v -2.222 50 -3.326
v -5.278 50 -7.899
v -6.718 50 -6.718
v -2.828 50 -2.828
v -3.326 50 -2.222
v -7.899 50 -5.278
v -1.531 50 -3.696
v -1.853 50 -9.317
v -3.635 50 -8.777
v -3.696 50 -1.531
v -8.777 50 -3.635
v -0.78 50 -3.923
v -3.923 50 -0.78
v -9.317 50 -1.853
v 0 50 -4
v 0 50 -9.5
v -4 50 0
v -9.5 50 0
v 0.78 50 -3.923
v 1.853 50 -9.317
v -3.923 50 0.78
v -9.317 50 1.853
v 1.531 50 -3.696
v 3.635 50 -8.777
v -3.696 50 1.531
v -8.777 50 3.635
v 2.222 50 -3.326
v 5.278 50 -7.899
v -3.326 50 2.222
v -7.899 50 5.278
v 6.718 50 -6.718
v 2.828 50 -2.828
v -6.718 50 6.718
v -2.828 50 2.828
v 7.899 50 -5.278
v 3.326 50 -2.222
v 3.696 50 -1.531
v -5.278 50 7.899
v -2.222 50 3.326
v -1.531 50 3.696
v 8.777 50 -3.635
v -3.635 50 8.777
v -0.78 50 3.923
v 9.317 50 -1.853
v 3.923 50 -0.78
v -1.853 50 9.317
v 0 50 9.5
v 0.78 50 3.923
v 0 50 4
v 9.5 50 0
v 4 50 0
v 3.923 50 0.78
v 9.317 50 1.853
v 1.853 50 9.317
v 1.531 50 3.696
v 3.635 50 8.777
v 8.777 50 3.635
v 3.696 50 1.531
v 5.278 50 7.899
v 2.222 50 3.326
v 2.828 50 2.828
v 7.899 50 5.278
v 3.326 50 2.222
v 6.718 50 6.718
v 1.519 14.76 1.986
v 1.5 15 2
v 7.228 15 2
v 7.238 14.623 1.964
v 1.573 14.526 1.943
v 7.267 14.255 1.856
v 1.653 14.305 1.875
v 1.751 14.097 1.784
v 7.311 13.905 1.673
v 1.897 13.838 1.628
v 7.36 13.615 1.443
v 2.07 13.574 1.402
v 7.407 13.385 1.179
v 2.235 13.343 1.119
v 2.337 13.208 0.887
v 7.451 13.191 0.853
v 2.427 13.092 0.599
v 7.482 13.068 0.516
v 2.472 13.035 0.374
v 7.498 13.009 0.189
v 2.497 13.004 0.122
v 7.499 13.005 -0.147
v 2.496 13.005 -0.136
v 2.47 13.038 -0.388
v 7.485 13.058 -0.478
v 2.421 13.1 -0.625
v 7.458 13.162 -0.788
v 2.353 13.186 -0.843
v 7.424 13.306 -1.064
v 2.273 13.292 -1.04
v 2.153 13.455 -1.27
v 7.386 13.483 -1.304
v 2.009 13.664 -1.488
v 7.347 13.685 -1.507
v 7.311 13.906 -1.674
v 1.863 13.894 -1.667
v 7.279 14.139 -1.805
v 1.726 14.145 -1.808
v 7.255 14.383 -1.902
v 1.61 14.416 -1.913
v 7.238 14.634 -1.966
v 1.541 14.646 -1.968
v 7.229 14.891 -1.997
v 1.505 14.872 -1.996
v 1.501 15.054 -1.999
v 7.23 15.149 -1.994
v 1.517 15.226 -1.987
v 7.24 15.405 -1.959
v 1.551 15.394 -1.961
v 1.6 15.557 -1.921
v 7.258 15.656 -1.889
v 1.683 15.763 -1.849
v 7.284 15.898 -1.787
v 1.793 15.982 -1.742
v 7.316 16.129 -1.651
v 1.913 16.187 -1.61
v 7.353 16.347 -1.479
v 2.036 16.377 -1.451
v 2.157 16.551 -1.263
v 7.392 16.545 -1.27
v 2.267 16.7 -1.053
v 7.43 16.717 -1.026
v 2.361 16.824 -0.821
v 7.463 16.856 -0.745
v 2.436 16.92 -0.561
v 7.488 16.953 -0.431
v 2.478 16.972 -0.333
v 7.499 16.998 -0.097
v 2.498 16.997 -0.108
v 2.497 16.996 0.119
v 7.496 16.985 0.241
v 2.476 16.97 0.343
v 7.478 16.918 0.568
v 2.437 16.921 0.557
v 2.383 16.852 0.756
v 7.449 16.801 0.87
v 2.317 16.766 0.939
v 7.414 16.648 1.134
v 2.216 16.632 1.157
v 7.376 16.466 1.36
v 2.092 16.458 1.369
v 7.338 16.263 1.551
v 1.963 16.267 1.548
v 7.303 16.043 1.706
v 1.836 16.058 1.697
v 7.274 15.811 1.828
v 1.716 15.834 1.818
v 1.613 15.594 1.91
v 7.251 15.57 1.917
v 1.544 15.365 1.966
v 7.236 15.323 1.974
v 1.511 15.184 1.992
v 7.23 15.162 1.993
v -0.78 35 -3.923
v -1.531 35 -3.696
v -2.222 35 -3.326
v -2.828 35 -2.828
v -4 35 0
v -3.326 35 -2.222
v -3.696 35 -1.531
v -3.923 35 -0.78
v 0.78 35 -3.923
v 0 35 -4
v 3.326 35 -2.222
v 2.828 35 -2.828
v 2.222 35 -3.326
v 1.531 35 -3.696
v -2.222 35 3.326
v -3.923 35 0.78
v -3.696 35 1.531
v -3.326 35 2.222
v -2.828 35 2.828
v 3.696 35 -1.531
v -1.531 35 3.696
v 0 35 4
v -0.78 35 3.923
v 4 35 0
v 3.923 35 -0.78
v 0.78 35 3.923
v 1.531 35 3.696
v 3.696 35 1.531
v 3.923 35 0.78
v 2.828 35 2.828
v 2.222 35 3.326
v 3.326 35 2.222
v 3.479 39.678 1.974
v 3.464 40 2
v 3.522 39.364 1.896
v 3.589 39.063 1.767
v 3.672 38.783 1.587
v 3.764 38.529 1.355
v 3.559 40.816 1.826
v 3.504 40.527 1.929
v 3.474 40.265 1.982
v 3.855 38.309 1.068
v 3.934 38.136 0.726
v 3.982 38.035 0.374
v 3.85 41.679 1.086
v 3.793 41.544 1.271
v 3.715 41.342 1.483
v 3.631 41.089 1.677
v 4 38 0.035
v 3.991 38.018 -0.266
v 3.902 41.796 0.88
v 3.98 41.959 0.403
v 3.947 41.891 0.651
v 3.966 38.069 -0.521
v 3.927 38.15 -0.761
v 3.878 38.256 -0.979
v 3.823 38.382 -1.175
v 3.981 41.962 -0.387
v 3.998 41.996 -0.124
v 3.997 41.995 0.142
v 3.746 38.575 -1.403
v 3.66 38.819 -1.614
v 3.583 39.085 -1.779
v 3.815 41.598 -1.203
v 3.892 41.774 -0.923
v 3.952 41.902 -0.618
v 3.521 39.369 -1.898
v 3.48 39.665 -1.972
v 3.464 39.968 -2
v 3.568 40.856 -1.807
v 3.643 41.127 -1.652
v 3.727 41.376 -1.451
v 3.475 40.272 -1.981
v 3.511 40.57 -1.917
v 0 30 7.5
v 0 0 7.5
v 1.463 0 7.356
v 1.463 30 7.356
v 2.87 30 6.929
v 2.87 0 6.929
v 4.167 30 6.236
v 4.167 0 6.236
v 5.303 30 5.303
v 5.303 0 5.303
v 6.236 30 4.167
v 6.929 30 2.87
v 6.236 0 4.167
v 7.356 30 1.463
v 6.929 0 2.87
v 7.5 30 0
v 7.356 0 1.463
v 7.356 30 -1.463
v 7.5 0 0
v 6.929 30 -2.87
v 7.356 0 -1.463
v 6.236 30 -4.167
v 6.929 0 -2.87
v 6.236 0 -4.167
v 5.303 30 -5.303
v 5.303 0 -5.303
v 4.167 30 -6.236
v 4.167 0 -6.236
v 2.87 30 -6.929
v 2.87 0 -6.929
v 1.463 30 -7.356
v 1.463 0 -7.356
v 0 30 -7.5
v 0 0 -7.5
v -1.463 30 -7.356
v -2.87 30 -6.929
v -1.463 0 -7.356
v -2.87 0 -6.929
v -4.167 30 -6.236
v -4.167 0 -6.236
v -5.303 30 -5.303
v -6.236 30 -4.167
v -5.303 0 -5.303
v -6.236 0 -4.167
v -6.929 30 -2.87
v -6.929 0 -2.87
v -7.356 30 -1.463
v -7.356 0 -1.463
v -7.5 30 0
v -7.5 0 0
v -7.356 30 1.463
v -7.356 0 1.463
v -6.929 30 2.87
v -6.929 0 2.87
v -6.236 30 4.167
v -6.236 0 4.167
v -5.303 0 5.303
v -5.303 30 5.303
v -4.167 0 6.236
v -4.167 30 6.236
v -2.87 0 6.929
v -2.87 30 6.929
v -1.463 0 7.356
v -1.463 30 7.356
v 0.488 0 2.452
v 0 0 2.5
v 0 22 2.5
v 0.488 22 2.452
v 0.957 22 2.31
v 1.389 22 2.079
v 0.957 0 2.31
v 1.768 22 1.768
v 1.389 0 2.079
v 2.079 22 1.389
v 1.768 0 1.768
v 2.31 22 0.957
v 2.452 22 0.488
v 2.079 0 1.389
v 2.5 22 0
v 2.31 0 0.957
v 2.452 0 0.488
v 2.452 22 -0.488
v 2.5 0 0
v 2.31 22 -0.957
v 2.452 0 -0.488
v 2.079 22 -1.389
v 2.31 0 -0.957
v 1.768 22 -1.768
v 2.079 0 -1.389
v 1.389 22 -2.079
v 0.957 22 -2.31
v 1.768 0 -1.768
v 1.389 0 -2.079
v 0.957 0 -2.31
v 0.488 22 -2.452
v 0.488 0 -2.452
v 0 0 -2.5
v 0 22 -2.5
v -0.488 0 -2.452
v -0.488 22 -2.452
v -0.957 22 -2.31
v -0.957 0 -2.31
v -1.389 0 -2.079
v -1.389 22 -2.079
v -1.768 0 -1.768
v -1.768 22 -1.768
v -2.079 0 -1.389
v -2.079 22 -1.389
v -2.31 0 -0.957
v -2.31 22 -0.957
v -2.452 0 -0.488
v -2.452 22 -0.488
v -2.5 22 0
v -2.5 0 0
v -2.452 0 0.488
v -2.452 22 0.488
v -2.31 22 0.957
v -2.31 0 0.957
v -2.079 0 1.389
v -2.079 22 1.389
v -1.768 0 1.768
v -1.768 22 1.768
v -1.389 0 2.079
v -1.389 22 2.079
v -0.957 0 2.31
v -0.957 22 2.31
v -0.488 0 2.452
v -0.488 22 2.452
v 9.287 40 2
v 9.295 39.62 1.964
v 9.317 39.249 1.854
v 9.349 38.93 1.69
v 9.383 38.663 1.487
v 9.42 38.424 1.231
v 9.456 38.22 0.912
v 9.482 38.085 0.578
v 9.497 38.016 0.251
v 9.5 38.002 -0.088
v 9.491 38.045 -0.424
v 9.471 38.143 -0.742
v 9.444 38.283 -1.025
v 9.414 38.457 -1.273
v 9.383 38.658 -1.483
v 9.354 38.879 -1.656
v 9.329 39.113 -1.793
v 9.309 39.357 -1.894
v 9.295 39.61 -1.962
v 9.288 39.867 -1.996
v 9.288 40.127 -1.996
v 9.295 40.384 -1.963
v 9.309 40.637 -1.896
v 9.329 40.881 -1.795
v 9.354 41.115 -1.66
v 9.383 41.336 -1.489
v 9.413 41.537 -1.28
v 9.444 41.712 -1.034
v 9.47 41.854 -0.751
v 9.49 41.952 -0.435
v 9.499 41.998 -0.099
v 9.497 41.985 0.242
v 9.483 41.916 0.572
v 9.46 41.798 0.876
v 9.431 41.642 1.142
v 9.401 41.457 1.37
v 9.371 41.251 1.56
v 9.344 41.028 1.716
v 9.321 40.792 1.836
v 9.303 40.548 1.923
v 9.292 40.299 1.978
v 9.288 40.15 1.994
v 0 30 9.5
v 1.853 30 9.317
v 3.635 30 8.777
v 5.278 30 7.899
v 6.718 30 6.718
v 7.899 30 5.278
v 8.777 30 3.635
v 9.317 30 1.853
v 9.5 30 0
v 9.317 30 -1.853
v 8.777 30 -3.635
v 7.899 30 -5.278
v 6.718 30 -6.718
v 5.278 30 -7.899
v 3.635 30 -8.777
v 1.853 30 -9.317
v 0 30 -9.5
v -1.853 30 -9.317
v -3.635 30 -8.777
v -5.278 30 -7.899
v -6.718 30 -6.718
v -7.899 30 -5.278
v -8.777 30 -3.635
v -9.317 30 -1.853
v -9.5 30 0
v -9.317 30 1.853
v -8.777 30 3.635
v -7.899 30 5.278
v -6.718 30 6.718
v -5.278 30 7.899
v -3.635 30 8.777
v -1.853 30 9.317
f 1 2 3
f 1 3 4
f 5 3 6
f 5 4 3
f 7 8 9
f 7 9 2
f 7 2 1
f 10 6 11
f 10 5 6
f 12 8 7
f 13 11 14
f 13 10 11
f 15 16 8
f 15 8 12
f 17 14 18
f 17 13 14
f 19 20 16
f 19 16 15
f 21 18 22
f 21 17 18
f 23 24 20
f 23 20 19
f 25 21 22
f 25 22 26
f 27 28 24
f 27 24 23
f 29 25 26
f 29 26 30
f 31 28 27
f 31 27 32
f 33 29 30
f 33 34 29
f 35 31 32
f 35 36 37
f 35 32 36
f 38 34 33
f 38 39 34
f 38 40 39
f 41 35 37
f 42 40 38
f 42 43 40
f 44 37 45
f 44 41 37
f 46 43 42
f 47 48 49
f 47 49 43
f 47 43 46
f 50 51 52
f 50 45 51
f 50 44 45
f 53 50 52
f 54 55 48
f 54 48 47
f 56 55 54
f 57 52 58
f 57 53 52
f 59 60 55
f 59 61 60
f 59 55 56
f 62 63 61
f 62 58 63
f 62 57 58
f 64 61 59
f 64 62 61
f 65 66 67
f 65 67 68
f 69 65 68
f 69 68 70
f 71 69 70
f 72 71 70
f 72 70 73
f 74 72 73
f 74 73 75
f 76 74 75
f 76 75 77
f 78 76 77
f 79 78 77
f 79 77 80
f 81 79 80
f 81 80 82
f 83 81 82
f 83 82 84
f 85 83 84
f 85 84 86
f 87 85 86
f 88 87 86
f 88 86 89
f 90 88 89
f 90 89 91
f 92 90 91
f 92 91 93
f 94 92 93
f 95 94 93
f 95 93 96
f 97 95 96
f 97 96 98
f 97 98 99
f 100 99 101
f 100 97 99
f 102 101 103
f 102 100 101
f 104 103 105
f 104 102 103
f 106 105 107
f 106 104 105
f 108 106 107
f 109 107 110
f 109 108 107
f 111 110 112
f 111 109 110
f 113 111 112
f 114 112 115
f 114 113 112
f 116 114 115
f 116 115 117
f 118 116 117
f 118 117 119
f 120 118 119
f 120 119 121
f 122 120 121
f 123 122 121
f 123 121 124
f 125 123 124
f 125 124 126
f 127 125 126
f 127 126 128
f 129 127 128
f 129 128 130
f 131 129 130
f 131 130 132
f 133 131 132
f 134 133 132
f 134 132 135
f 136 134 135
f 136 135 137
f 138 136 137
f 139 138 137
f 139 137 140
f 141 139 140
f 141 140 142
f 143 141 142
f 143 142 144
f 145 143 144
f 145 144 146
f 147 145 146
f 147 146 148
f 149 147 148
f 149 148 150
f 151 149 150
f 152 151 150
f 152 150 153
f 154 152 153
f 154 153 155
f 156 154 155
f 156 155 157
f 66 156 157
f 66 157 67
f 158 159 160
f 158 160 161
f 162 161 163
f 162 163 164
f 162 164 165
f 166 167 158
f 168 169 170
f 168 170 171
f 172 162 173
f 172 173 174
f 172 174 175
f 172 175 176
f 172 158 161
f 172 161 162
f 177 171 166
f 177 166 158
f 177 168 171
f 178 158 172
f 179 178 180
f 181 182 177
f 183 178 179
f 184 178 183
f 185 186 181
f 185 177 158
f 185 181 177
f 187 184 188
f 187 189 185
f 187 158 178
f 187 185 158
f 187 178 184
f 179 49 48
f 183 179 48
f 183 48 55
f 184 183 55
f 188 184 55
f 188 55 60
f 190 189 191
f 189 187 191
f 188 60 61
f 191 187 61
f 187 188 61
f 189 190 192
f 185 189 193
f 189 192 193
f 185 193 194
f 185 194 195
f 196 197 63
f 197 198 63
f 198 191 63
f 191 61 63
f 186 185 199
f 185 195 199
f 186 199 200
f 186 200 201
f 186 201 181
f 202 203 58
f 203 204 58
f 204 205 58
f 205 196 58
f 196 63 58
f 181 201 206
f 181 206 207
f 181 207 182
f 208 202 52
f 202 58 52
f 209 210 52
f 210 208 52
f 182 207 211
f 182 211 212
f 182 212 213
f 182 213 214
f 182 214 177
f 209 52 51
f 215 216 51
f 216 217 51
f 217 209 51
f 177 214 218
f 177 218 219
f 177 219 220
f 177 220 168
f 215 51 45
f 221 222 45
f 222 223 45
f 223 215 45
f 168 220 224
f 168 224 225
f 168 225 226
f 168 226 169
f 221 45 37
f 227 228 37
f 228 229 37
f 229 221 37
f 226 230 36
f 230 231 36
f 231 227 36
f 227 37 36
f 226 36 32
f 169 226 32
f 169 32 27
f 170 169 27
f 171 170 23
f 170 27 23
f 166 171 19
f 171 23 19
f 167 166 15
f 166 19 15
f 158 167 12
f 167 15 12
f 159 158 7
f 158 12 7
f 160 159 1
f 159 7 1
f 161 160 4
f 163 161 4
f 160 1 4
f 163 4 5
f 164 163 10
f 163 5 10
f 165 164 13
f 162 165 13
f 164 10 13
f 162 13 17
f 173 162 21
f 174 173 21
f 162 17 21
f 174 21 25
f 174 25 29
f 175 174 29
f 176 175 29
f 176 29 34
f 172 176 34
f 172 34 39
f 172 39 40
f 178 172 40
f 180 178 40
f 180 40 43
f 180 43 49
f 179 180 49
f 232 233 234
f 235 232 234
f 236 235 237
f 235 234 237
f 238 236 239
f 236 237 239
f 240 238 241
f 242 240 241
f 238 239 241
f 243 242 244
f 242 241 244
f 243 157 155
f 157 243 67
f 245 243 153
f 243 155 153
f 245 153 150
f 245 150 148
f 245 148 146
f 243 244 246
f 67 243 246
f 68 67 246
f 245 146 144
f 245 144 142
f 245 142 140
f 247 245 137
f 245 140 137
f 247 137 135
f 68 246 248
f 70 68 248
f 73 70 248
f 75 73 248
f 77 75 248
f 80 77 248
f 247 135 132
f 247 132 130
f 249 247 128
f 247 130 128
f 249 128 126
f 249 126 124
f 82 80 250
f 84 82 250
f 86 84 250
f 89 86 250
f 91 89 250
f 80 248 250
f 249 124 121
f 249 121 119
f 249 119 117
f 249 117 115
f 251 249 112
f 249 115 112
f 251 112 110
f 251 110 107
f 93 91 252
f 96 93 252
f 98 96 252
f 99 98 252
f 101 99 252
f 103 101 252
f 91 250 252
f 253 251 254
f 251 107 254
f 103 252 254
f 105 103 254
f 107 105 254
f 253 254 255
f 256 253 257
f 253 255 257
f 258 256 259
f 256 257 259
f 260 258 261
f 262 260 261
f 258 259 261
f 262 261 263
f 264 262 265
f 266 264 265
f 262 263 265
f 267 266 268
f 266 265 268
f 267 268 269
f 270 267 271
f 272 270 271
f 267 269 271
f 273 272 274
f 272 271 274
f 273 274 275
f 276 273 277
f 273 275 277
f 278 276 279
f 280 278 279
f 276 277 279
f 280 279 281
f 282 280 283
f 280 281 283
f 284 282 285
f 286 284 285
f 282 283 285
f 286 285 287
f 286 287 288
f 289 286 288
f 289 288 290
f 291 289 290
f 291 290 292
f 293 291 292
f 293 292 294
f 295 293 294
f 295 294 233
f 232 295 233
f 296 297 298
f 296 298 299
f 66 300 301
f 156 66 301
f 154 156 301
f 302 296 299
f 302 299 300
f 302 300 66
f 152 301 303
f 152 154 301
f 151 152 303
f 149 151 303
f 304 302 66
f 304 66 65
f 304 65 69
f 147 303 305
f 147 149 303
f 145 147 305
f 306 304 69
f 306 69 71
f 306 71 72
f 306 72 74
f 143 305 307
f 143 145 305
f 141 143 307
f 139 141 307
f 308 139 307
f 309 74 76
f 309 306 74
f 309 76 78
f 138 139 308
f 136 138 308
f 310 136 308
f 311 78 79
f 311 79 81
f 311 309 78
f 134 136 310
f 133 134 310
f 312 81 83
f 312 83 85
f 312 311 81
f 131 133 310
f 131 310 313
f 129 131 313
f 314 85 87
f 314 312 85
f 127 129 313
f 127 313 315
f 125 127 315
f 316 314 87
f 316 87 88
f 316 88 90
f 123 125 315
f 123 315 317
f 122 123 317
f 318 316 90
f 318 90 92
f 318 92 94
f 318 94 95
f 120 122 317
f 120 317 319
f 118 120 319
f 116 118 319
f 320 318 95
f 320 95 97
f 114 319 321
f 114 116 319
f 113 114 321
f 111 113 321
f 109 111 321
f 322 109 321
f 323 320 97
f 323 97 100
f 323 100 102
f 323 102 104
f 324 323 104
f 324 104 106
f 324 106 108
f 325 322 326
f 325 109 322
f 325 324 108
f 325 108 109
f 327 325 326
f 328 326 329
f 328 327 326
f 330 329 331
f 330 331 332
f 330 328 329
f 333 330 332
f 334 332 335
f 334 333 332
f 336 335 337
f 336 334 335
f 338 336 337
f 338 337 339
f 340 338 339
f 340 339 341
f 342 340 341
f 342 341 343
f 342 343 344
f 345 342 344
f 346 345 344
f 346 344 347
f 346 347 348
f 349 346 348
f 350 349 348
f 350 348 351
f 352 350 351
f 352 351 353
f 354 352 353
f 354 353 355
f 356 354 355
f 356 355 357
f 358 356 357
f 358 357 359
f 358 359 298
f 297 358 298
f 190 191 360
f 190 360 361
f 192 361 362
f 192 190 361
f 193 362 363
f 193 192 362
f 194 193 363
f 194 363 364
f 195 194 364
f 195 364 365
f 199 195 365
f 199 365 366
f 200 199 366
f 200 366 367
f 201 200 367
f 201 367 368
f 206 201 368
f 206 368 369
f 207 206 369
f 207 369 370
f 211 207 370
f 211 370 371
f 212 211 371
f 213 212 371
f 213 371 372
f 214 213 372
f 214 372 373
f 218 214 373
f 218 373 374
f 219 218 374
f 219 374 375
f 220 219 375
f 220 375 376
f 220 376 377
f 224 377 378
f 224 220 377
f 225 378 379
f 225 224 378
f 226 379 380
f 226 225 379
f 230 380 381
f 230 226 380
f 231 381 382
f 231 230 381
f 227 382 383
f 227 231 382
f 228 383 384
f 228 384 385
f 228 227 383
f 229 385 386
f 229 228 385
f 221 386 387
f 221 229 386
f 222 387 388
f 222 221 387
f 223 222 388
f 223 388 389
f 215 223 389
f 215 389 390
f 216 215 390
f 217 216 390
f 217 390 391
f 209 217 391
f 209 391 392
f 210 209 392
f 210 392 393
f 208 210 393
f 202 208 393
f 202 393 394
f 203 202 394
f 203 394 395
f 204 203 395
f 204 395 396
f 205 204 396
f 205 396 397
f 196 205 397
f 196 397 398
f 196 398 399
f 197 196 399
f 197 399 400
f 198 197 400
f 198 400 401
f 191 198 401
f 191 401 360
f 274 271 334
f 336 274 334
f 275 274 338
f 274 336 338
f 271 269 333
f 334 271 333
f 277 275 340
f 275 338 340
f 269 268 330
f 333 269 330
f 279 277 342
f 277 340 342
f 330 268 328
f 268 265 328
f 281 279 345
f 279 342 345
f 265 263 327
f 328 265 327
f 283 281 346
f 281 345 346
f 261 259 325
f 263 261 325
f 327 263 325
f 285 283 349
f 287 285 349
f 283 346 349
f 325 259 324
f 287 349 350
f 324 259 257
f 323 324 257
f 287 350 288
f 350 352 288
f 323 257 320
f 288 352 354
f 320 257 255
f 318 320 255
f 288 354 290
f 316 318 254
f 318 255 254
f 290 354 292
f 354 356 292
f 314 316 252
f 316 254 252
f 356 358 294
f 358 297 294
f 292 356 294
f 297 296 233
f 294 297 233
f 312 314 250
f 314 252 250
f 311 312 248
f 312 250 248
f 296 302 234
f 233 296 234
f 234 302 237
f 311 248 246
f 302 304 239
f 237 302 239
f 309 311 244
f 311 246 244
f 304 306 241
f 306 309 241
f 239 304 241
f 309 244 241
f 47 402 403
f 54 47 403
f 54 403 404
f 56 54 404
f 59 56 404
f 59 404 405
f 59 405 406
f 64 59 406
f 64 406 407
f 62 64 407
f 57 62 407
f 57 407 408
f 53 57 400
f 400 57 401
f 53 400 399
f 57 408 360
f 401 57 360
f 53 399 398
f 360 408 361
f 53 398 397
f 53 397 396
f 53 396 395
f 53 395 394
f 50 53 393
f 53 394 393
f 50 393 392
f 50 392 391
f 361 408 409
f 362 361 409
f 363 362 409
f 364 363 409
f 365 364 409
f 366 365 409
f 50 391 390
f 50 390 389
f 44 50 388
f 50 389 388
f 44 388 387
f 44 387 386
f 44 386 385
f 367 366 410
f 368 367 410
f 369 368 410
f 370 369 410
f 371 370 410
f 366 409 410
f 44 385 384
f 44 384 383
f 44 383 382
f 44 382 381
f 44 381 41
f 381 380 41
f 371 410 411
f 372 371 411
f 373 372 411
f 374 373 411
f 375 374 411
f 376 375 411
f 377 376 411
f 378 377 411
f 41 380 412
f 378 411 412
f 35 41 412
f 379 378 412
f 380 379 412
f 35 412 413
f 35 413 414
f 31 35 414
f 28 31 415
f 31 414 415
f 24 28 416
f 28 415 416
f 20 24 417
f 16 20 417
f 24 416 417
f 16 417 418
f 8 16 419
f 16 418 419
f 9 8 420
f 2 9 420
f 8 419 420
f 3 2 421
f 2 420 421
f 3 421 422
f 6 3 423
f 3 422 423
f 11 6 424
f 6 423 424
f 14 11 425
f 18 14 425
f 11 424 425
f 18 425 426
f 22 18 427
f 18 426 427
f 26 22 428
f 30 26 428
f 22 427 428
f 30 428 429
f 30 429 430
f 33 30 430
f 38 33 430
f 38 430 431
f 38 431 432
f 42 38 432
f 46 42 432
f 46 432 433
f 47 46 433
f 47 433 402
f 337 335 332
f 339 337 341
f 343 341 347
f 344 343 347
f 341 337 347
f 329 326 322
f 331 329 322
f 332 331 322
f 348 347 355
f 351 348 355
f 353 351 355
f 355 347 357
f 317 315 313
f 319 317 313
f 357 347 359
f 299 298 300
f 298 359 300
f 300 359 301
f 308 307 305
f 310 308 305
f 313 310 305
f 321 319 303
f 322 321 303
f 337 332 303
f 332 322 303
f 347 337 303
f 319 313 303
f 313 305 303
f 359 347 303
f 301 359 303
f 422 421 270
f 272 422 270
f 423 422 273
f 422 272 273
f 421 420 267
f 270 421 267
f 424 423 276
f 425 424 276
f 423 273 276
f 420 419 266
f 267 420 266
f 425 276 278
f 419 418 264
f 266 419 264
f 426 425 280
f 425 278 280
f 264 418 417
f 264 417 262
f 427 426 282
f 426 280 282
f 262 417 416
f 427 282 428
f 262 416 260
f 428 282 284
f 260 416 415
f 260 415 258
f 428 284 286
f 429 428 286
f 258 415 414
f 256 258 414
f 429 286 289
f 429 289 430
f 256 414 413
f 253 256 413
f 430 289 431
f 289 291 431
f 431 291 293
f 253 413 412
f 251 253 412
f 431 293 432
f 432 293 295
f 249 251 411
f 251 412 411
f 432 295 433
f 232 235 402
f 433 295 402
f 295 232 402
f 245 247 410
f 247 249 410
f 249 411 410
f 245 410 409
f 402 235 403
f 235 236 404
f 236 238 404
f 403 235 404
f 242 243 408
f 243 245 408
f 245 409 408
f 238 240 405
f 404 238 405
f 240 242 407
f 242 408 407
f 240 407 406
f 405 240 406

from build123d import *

# Parameters (mm, degrees)
SKETCH1_R           = 7.5
SKETCH1_R_2         = 2.5
BOSS_EXTRUDE1_DEPTH = 22
SKETCH2_R           = 7.5
BOSS_EXTRUDE2_DEPTH = 8
SKETCH3_R           = 9.5
BOSS_EXTRUDE3_DEPTH = 20
SKETCH5_R           = 4
CUT_EXTRUDE1_DEPTH  = 15
SKETCH6_R           = 2
CUT_EXTRUDE2_DEPTH  = 17


with BuildPart() as part:
    # Sketch1 → Boss-Extrude1 (new body)
    with BuildSketch(Plane(origin=(0, 0, 0), x_dir=(1, 0, 0), z_dir=(0, 1, 0))):
        with Locations(Location((0, 0, 0), (0, 0, 270))):
            Circle(SKETCH1_R)
        with Locations(Location((0, 0, 0), (0, 0, 270))):
            Circle(SKETCH1_R_2, mode=Mode.SUBTRACT)
    extrude(amount=BOSS_EXTRUDE1_DEPTH)

    # Sketch2 → Boss-Extrude2 (add)
    with BuildSketch(Plane(origin=(0, 22, 0), x_dir=(1, 0, 0), z_dir=(0, 1, 0))):
        with Locations(Location((0, 0, 0), (0, 0, 270))):
            Circle(SKETCH2_R)
    extrude(amount=BOSS_EXTRUDE2_DEPTH)

    # Sketch3 → Boss-Extrude3 (add)
    with BuildSketch(Plane(origin=(0, 30, 0), x_dir=(1, 0, 0), z_dir=(0, 1, 0))):
        with Locations(Location((0, 0, 0), (0, 0, 270))):
            Circle(SKETCH3_R)
    extrude(amount=BOSS_EXTRUDE3_DEPTH)

    # Sketch5 → Cut-Extrude1 (cut)
    with BuildSketch(Plane(origin=(0, 50, 0), x_dir=(1, 0, 0), z_dir=(0, 1, 0))):
        with Locations(Location((0, 0, 0), (0, 0, 270))):
            Circle(SKETCH5_R)
    extrude(amount=-CUT_EXTRUDE1_DEPTH, mode=Mode.SUBTRACT)

    # Sketch6 → Cut-Extrude2 (cut)
    with BuildSketch(Plane(origin=(0, 0, 0), x_dir=(0, 0, -1), z_dir=(1, 0, 0))):
        with Locations(Location((0, 15, 0), (0, 0, 180))):
            Circle(SKETCH6_R)
        with Locations(Location((0, 40, 0), (0, 0, 180))):
            Circle(SKETCH6_R)
    extrude(amount=CUT_EXTRUDE2_DEPTH, mode=Mode.SUBTRACT)


solid = part.part
